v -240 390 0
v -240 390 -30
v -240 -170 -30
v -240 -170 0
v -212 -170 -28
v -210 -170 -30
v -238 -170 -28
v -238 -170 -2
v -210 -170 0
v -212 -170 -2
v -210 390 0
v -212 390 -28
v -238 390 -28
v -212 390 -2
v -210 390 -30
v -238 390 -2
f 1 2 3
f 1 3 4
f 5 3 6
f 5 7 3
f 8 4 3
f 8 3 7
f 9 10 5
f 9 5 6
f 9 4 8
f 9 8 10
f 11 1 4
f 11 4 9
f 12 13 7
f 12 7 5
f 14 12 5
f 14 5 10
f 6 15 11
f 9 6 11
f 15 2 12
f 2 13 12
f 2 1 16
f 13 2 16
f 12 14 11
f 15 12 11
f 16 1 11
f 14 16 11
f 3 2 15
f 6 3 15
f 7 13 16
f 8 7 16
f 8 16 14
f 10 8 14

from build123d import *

# Parameters (mm, degrees)
SKETCH001_W   = 30
SKETCH001_H   = 30
SKETCH001_W_2 = 26
SKETCH001_H_2 = 26
PAD001_DEPTH  = 560


with BuildPart() as part:
    # Sketch001 → Pad001 (new body)
    with BuildSketch(Plane.XZ):
        with Locations((15, -15)):
            Rectangle(SKETCH001_W, SKETCH001_H)
        with Locations((15, -15)):
            Rectangle(SKETCH001_W_2, SKETCH001_H_2, mode=Mode.SUBTRACT)
    extrude(amount=PAD001_DEPTH)


with BuildPart() as part_1:
    # Body001 placement: moved
    add(part.part.moved(Location((-240, 390, 0))))


solid = part_1.part
